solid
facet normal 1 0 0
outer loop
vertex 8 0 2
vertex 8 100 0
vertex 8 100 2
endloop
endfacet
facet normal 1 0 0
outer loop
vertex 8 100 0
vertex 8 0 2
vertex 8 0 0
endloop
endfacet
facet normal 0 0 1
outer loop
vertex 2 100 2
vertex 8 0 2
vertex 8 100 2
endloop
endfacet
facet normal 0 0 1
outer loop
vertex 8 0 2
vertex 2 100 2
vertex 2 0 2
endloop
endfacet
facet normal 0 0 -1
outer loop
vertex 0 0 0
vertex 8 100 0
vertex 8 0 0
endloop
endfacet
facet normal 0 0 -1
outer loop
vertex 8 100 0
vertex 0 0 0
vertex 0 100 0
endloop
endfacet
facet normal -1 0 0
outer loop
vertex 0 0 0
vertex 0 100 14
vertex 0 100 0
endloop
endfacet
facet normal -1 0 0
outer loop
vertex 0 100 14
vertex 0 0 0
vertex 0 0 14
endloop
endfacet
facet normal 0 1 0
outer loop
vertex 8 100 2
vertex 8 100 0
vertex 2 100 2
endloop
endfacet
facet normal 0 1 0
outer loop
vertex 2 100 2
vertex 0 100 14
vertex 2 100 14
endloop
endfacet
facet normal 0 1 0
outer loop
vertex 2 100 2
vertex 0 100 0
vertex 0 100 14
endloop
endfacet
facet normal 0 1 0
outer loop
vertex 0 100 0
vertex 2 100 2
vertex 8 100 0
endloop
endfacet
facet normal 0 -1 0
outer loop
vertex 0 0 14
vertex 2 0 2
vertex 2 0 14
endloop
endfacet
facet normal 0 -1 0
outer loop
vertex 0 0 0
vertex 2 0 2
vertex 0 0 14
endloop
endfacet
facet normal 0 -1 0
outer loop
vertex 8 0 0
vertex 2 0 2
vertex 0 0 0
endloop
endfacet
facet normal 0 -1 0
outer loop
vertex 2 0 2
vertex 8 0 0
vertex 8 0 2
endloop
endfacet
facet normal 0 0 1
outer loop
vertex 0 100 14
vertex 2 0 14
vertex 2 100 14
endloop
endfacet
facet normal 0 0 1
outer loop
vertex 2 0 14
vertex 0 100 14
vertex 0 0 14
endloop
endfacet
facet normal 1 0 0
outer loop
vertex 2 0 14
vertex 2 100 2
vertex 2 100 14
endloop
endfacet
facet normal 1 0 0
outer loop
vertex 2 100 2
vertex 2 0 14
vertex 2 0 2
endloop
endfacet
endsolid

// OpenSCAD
module SlatwallHook(width=5)
{
    cube([8,width,2]);
    translate([2,0,0])
        rotate([0,270,0])
            cube([14,width,2]);
}

SlatwallHook(100);
